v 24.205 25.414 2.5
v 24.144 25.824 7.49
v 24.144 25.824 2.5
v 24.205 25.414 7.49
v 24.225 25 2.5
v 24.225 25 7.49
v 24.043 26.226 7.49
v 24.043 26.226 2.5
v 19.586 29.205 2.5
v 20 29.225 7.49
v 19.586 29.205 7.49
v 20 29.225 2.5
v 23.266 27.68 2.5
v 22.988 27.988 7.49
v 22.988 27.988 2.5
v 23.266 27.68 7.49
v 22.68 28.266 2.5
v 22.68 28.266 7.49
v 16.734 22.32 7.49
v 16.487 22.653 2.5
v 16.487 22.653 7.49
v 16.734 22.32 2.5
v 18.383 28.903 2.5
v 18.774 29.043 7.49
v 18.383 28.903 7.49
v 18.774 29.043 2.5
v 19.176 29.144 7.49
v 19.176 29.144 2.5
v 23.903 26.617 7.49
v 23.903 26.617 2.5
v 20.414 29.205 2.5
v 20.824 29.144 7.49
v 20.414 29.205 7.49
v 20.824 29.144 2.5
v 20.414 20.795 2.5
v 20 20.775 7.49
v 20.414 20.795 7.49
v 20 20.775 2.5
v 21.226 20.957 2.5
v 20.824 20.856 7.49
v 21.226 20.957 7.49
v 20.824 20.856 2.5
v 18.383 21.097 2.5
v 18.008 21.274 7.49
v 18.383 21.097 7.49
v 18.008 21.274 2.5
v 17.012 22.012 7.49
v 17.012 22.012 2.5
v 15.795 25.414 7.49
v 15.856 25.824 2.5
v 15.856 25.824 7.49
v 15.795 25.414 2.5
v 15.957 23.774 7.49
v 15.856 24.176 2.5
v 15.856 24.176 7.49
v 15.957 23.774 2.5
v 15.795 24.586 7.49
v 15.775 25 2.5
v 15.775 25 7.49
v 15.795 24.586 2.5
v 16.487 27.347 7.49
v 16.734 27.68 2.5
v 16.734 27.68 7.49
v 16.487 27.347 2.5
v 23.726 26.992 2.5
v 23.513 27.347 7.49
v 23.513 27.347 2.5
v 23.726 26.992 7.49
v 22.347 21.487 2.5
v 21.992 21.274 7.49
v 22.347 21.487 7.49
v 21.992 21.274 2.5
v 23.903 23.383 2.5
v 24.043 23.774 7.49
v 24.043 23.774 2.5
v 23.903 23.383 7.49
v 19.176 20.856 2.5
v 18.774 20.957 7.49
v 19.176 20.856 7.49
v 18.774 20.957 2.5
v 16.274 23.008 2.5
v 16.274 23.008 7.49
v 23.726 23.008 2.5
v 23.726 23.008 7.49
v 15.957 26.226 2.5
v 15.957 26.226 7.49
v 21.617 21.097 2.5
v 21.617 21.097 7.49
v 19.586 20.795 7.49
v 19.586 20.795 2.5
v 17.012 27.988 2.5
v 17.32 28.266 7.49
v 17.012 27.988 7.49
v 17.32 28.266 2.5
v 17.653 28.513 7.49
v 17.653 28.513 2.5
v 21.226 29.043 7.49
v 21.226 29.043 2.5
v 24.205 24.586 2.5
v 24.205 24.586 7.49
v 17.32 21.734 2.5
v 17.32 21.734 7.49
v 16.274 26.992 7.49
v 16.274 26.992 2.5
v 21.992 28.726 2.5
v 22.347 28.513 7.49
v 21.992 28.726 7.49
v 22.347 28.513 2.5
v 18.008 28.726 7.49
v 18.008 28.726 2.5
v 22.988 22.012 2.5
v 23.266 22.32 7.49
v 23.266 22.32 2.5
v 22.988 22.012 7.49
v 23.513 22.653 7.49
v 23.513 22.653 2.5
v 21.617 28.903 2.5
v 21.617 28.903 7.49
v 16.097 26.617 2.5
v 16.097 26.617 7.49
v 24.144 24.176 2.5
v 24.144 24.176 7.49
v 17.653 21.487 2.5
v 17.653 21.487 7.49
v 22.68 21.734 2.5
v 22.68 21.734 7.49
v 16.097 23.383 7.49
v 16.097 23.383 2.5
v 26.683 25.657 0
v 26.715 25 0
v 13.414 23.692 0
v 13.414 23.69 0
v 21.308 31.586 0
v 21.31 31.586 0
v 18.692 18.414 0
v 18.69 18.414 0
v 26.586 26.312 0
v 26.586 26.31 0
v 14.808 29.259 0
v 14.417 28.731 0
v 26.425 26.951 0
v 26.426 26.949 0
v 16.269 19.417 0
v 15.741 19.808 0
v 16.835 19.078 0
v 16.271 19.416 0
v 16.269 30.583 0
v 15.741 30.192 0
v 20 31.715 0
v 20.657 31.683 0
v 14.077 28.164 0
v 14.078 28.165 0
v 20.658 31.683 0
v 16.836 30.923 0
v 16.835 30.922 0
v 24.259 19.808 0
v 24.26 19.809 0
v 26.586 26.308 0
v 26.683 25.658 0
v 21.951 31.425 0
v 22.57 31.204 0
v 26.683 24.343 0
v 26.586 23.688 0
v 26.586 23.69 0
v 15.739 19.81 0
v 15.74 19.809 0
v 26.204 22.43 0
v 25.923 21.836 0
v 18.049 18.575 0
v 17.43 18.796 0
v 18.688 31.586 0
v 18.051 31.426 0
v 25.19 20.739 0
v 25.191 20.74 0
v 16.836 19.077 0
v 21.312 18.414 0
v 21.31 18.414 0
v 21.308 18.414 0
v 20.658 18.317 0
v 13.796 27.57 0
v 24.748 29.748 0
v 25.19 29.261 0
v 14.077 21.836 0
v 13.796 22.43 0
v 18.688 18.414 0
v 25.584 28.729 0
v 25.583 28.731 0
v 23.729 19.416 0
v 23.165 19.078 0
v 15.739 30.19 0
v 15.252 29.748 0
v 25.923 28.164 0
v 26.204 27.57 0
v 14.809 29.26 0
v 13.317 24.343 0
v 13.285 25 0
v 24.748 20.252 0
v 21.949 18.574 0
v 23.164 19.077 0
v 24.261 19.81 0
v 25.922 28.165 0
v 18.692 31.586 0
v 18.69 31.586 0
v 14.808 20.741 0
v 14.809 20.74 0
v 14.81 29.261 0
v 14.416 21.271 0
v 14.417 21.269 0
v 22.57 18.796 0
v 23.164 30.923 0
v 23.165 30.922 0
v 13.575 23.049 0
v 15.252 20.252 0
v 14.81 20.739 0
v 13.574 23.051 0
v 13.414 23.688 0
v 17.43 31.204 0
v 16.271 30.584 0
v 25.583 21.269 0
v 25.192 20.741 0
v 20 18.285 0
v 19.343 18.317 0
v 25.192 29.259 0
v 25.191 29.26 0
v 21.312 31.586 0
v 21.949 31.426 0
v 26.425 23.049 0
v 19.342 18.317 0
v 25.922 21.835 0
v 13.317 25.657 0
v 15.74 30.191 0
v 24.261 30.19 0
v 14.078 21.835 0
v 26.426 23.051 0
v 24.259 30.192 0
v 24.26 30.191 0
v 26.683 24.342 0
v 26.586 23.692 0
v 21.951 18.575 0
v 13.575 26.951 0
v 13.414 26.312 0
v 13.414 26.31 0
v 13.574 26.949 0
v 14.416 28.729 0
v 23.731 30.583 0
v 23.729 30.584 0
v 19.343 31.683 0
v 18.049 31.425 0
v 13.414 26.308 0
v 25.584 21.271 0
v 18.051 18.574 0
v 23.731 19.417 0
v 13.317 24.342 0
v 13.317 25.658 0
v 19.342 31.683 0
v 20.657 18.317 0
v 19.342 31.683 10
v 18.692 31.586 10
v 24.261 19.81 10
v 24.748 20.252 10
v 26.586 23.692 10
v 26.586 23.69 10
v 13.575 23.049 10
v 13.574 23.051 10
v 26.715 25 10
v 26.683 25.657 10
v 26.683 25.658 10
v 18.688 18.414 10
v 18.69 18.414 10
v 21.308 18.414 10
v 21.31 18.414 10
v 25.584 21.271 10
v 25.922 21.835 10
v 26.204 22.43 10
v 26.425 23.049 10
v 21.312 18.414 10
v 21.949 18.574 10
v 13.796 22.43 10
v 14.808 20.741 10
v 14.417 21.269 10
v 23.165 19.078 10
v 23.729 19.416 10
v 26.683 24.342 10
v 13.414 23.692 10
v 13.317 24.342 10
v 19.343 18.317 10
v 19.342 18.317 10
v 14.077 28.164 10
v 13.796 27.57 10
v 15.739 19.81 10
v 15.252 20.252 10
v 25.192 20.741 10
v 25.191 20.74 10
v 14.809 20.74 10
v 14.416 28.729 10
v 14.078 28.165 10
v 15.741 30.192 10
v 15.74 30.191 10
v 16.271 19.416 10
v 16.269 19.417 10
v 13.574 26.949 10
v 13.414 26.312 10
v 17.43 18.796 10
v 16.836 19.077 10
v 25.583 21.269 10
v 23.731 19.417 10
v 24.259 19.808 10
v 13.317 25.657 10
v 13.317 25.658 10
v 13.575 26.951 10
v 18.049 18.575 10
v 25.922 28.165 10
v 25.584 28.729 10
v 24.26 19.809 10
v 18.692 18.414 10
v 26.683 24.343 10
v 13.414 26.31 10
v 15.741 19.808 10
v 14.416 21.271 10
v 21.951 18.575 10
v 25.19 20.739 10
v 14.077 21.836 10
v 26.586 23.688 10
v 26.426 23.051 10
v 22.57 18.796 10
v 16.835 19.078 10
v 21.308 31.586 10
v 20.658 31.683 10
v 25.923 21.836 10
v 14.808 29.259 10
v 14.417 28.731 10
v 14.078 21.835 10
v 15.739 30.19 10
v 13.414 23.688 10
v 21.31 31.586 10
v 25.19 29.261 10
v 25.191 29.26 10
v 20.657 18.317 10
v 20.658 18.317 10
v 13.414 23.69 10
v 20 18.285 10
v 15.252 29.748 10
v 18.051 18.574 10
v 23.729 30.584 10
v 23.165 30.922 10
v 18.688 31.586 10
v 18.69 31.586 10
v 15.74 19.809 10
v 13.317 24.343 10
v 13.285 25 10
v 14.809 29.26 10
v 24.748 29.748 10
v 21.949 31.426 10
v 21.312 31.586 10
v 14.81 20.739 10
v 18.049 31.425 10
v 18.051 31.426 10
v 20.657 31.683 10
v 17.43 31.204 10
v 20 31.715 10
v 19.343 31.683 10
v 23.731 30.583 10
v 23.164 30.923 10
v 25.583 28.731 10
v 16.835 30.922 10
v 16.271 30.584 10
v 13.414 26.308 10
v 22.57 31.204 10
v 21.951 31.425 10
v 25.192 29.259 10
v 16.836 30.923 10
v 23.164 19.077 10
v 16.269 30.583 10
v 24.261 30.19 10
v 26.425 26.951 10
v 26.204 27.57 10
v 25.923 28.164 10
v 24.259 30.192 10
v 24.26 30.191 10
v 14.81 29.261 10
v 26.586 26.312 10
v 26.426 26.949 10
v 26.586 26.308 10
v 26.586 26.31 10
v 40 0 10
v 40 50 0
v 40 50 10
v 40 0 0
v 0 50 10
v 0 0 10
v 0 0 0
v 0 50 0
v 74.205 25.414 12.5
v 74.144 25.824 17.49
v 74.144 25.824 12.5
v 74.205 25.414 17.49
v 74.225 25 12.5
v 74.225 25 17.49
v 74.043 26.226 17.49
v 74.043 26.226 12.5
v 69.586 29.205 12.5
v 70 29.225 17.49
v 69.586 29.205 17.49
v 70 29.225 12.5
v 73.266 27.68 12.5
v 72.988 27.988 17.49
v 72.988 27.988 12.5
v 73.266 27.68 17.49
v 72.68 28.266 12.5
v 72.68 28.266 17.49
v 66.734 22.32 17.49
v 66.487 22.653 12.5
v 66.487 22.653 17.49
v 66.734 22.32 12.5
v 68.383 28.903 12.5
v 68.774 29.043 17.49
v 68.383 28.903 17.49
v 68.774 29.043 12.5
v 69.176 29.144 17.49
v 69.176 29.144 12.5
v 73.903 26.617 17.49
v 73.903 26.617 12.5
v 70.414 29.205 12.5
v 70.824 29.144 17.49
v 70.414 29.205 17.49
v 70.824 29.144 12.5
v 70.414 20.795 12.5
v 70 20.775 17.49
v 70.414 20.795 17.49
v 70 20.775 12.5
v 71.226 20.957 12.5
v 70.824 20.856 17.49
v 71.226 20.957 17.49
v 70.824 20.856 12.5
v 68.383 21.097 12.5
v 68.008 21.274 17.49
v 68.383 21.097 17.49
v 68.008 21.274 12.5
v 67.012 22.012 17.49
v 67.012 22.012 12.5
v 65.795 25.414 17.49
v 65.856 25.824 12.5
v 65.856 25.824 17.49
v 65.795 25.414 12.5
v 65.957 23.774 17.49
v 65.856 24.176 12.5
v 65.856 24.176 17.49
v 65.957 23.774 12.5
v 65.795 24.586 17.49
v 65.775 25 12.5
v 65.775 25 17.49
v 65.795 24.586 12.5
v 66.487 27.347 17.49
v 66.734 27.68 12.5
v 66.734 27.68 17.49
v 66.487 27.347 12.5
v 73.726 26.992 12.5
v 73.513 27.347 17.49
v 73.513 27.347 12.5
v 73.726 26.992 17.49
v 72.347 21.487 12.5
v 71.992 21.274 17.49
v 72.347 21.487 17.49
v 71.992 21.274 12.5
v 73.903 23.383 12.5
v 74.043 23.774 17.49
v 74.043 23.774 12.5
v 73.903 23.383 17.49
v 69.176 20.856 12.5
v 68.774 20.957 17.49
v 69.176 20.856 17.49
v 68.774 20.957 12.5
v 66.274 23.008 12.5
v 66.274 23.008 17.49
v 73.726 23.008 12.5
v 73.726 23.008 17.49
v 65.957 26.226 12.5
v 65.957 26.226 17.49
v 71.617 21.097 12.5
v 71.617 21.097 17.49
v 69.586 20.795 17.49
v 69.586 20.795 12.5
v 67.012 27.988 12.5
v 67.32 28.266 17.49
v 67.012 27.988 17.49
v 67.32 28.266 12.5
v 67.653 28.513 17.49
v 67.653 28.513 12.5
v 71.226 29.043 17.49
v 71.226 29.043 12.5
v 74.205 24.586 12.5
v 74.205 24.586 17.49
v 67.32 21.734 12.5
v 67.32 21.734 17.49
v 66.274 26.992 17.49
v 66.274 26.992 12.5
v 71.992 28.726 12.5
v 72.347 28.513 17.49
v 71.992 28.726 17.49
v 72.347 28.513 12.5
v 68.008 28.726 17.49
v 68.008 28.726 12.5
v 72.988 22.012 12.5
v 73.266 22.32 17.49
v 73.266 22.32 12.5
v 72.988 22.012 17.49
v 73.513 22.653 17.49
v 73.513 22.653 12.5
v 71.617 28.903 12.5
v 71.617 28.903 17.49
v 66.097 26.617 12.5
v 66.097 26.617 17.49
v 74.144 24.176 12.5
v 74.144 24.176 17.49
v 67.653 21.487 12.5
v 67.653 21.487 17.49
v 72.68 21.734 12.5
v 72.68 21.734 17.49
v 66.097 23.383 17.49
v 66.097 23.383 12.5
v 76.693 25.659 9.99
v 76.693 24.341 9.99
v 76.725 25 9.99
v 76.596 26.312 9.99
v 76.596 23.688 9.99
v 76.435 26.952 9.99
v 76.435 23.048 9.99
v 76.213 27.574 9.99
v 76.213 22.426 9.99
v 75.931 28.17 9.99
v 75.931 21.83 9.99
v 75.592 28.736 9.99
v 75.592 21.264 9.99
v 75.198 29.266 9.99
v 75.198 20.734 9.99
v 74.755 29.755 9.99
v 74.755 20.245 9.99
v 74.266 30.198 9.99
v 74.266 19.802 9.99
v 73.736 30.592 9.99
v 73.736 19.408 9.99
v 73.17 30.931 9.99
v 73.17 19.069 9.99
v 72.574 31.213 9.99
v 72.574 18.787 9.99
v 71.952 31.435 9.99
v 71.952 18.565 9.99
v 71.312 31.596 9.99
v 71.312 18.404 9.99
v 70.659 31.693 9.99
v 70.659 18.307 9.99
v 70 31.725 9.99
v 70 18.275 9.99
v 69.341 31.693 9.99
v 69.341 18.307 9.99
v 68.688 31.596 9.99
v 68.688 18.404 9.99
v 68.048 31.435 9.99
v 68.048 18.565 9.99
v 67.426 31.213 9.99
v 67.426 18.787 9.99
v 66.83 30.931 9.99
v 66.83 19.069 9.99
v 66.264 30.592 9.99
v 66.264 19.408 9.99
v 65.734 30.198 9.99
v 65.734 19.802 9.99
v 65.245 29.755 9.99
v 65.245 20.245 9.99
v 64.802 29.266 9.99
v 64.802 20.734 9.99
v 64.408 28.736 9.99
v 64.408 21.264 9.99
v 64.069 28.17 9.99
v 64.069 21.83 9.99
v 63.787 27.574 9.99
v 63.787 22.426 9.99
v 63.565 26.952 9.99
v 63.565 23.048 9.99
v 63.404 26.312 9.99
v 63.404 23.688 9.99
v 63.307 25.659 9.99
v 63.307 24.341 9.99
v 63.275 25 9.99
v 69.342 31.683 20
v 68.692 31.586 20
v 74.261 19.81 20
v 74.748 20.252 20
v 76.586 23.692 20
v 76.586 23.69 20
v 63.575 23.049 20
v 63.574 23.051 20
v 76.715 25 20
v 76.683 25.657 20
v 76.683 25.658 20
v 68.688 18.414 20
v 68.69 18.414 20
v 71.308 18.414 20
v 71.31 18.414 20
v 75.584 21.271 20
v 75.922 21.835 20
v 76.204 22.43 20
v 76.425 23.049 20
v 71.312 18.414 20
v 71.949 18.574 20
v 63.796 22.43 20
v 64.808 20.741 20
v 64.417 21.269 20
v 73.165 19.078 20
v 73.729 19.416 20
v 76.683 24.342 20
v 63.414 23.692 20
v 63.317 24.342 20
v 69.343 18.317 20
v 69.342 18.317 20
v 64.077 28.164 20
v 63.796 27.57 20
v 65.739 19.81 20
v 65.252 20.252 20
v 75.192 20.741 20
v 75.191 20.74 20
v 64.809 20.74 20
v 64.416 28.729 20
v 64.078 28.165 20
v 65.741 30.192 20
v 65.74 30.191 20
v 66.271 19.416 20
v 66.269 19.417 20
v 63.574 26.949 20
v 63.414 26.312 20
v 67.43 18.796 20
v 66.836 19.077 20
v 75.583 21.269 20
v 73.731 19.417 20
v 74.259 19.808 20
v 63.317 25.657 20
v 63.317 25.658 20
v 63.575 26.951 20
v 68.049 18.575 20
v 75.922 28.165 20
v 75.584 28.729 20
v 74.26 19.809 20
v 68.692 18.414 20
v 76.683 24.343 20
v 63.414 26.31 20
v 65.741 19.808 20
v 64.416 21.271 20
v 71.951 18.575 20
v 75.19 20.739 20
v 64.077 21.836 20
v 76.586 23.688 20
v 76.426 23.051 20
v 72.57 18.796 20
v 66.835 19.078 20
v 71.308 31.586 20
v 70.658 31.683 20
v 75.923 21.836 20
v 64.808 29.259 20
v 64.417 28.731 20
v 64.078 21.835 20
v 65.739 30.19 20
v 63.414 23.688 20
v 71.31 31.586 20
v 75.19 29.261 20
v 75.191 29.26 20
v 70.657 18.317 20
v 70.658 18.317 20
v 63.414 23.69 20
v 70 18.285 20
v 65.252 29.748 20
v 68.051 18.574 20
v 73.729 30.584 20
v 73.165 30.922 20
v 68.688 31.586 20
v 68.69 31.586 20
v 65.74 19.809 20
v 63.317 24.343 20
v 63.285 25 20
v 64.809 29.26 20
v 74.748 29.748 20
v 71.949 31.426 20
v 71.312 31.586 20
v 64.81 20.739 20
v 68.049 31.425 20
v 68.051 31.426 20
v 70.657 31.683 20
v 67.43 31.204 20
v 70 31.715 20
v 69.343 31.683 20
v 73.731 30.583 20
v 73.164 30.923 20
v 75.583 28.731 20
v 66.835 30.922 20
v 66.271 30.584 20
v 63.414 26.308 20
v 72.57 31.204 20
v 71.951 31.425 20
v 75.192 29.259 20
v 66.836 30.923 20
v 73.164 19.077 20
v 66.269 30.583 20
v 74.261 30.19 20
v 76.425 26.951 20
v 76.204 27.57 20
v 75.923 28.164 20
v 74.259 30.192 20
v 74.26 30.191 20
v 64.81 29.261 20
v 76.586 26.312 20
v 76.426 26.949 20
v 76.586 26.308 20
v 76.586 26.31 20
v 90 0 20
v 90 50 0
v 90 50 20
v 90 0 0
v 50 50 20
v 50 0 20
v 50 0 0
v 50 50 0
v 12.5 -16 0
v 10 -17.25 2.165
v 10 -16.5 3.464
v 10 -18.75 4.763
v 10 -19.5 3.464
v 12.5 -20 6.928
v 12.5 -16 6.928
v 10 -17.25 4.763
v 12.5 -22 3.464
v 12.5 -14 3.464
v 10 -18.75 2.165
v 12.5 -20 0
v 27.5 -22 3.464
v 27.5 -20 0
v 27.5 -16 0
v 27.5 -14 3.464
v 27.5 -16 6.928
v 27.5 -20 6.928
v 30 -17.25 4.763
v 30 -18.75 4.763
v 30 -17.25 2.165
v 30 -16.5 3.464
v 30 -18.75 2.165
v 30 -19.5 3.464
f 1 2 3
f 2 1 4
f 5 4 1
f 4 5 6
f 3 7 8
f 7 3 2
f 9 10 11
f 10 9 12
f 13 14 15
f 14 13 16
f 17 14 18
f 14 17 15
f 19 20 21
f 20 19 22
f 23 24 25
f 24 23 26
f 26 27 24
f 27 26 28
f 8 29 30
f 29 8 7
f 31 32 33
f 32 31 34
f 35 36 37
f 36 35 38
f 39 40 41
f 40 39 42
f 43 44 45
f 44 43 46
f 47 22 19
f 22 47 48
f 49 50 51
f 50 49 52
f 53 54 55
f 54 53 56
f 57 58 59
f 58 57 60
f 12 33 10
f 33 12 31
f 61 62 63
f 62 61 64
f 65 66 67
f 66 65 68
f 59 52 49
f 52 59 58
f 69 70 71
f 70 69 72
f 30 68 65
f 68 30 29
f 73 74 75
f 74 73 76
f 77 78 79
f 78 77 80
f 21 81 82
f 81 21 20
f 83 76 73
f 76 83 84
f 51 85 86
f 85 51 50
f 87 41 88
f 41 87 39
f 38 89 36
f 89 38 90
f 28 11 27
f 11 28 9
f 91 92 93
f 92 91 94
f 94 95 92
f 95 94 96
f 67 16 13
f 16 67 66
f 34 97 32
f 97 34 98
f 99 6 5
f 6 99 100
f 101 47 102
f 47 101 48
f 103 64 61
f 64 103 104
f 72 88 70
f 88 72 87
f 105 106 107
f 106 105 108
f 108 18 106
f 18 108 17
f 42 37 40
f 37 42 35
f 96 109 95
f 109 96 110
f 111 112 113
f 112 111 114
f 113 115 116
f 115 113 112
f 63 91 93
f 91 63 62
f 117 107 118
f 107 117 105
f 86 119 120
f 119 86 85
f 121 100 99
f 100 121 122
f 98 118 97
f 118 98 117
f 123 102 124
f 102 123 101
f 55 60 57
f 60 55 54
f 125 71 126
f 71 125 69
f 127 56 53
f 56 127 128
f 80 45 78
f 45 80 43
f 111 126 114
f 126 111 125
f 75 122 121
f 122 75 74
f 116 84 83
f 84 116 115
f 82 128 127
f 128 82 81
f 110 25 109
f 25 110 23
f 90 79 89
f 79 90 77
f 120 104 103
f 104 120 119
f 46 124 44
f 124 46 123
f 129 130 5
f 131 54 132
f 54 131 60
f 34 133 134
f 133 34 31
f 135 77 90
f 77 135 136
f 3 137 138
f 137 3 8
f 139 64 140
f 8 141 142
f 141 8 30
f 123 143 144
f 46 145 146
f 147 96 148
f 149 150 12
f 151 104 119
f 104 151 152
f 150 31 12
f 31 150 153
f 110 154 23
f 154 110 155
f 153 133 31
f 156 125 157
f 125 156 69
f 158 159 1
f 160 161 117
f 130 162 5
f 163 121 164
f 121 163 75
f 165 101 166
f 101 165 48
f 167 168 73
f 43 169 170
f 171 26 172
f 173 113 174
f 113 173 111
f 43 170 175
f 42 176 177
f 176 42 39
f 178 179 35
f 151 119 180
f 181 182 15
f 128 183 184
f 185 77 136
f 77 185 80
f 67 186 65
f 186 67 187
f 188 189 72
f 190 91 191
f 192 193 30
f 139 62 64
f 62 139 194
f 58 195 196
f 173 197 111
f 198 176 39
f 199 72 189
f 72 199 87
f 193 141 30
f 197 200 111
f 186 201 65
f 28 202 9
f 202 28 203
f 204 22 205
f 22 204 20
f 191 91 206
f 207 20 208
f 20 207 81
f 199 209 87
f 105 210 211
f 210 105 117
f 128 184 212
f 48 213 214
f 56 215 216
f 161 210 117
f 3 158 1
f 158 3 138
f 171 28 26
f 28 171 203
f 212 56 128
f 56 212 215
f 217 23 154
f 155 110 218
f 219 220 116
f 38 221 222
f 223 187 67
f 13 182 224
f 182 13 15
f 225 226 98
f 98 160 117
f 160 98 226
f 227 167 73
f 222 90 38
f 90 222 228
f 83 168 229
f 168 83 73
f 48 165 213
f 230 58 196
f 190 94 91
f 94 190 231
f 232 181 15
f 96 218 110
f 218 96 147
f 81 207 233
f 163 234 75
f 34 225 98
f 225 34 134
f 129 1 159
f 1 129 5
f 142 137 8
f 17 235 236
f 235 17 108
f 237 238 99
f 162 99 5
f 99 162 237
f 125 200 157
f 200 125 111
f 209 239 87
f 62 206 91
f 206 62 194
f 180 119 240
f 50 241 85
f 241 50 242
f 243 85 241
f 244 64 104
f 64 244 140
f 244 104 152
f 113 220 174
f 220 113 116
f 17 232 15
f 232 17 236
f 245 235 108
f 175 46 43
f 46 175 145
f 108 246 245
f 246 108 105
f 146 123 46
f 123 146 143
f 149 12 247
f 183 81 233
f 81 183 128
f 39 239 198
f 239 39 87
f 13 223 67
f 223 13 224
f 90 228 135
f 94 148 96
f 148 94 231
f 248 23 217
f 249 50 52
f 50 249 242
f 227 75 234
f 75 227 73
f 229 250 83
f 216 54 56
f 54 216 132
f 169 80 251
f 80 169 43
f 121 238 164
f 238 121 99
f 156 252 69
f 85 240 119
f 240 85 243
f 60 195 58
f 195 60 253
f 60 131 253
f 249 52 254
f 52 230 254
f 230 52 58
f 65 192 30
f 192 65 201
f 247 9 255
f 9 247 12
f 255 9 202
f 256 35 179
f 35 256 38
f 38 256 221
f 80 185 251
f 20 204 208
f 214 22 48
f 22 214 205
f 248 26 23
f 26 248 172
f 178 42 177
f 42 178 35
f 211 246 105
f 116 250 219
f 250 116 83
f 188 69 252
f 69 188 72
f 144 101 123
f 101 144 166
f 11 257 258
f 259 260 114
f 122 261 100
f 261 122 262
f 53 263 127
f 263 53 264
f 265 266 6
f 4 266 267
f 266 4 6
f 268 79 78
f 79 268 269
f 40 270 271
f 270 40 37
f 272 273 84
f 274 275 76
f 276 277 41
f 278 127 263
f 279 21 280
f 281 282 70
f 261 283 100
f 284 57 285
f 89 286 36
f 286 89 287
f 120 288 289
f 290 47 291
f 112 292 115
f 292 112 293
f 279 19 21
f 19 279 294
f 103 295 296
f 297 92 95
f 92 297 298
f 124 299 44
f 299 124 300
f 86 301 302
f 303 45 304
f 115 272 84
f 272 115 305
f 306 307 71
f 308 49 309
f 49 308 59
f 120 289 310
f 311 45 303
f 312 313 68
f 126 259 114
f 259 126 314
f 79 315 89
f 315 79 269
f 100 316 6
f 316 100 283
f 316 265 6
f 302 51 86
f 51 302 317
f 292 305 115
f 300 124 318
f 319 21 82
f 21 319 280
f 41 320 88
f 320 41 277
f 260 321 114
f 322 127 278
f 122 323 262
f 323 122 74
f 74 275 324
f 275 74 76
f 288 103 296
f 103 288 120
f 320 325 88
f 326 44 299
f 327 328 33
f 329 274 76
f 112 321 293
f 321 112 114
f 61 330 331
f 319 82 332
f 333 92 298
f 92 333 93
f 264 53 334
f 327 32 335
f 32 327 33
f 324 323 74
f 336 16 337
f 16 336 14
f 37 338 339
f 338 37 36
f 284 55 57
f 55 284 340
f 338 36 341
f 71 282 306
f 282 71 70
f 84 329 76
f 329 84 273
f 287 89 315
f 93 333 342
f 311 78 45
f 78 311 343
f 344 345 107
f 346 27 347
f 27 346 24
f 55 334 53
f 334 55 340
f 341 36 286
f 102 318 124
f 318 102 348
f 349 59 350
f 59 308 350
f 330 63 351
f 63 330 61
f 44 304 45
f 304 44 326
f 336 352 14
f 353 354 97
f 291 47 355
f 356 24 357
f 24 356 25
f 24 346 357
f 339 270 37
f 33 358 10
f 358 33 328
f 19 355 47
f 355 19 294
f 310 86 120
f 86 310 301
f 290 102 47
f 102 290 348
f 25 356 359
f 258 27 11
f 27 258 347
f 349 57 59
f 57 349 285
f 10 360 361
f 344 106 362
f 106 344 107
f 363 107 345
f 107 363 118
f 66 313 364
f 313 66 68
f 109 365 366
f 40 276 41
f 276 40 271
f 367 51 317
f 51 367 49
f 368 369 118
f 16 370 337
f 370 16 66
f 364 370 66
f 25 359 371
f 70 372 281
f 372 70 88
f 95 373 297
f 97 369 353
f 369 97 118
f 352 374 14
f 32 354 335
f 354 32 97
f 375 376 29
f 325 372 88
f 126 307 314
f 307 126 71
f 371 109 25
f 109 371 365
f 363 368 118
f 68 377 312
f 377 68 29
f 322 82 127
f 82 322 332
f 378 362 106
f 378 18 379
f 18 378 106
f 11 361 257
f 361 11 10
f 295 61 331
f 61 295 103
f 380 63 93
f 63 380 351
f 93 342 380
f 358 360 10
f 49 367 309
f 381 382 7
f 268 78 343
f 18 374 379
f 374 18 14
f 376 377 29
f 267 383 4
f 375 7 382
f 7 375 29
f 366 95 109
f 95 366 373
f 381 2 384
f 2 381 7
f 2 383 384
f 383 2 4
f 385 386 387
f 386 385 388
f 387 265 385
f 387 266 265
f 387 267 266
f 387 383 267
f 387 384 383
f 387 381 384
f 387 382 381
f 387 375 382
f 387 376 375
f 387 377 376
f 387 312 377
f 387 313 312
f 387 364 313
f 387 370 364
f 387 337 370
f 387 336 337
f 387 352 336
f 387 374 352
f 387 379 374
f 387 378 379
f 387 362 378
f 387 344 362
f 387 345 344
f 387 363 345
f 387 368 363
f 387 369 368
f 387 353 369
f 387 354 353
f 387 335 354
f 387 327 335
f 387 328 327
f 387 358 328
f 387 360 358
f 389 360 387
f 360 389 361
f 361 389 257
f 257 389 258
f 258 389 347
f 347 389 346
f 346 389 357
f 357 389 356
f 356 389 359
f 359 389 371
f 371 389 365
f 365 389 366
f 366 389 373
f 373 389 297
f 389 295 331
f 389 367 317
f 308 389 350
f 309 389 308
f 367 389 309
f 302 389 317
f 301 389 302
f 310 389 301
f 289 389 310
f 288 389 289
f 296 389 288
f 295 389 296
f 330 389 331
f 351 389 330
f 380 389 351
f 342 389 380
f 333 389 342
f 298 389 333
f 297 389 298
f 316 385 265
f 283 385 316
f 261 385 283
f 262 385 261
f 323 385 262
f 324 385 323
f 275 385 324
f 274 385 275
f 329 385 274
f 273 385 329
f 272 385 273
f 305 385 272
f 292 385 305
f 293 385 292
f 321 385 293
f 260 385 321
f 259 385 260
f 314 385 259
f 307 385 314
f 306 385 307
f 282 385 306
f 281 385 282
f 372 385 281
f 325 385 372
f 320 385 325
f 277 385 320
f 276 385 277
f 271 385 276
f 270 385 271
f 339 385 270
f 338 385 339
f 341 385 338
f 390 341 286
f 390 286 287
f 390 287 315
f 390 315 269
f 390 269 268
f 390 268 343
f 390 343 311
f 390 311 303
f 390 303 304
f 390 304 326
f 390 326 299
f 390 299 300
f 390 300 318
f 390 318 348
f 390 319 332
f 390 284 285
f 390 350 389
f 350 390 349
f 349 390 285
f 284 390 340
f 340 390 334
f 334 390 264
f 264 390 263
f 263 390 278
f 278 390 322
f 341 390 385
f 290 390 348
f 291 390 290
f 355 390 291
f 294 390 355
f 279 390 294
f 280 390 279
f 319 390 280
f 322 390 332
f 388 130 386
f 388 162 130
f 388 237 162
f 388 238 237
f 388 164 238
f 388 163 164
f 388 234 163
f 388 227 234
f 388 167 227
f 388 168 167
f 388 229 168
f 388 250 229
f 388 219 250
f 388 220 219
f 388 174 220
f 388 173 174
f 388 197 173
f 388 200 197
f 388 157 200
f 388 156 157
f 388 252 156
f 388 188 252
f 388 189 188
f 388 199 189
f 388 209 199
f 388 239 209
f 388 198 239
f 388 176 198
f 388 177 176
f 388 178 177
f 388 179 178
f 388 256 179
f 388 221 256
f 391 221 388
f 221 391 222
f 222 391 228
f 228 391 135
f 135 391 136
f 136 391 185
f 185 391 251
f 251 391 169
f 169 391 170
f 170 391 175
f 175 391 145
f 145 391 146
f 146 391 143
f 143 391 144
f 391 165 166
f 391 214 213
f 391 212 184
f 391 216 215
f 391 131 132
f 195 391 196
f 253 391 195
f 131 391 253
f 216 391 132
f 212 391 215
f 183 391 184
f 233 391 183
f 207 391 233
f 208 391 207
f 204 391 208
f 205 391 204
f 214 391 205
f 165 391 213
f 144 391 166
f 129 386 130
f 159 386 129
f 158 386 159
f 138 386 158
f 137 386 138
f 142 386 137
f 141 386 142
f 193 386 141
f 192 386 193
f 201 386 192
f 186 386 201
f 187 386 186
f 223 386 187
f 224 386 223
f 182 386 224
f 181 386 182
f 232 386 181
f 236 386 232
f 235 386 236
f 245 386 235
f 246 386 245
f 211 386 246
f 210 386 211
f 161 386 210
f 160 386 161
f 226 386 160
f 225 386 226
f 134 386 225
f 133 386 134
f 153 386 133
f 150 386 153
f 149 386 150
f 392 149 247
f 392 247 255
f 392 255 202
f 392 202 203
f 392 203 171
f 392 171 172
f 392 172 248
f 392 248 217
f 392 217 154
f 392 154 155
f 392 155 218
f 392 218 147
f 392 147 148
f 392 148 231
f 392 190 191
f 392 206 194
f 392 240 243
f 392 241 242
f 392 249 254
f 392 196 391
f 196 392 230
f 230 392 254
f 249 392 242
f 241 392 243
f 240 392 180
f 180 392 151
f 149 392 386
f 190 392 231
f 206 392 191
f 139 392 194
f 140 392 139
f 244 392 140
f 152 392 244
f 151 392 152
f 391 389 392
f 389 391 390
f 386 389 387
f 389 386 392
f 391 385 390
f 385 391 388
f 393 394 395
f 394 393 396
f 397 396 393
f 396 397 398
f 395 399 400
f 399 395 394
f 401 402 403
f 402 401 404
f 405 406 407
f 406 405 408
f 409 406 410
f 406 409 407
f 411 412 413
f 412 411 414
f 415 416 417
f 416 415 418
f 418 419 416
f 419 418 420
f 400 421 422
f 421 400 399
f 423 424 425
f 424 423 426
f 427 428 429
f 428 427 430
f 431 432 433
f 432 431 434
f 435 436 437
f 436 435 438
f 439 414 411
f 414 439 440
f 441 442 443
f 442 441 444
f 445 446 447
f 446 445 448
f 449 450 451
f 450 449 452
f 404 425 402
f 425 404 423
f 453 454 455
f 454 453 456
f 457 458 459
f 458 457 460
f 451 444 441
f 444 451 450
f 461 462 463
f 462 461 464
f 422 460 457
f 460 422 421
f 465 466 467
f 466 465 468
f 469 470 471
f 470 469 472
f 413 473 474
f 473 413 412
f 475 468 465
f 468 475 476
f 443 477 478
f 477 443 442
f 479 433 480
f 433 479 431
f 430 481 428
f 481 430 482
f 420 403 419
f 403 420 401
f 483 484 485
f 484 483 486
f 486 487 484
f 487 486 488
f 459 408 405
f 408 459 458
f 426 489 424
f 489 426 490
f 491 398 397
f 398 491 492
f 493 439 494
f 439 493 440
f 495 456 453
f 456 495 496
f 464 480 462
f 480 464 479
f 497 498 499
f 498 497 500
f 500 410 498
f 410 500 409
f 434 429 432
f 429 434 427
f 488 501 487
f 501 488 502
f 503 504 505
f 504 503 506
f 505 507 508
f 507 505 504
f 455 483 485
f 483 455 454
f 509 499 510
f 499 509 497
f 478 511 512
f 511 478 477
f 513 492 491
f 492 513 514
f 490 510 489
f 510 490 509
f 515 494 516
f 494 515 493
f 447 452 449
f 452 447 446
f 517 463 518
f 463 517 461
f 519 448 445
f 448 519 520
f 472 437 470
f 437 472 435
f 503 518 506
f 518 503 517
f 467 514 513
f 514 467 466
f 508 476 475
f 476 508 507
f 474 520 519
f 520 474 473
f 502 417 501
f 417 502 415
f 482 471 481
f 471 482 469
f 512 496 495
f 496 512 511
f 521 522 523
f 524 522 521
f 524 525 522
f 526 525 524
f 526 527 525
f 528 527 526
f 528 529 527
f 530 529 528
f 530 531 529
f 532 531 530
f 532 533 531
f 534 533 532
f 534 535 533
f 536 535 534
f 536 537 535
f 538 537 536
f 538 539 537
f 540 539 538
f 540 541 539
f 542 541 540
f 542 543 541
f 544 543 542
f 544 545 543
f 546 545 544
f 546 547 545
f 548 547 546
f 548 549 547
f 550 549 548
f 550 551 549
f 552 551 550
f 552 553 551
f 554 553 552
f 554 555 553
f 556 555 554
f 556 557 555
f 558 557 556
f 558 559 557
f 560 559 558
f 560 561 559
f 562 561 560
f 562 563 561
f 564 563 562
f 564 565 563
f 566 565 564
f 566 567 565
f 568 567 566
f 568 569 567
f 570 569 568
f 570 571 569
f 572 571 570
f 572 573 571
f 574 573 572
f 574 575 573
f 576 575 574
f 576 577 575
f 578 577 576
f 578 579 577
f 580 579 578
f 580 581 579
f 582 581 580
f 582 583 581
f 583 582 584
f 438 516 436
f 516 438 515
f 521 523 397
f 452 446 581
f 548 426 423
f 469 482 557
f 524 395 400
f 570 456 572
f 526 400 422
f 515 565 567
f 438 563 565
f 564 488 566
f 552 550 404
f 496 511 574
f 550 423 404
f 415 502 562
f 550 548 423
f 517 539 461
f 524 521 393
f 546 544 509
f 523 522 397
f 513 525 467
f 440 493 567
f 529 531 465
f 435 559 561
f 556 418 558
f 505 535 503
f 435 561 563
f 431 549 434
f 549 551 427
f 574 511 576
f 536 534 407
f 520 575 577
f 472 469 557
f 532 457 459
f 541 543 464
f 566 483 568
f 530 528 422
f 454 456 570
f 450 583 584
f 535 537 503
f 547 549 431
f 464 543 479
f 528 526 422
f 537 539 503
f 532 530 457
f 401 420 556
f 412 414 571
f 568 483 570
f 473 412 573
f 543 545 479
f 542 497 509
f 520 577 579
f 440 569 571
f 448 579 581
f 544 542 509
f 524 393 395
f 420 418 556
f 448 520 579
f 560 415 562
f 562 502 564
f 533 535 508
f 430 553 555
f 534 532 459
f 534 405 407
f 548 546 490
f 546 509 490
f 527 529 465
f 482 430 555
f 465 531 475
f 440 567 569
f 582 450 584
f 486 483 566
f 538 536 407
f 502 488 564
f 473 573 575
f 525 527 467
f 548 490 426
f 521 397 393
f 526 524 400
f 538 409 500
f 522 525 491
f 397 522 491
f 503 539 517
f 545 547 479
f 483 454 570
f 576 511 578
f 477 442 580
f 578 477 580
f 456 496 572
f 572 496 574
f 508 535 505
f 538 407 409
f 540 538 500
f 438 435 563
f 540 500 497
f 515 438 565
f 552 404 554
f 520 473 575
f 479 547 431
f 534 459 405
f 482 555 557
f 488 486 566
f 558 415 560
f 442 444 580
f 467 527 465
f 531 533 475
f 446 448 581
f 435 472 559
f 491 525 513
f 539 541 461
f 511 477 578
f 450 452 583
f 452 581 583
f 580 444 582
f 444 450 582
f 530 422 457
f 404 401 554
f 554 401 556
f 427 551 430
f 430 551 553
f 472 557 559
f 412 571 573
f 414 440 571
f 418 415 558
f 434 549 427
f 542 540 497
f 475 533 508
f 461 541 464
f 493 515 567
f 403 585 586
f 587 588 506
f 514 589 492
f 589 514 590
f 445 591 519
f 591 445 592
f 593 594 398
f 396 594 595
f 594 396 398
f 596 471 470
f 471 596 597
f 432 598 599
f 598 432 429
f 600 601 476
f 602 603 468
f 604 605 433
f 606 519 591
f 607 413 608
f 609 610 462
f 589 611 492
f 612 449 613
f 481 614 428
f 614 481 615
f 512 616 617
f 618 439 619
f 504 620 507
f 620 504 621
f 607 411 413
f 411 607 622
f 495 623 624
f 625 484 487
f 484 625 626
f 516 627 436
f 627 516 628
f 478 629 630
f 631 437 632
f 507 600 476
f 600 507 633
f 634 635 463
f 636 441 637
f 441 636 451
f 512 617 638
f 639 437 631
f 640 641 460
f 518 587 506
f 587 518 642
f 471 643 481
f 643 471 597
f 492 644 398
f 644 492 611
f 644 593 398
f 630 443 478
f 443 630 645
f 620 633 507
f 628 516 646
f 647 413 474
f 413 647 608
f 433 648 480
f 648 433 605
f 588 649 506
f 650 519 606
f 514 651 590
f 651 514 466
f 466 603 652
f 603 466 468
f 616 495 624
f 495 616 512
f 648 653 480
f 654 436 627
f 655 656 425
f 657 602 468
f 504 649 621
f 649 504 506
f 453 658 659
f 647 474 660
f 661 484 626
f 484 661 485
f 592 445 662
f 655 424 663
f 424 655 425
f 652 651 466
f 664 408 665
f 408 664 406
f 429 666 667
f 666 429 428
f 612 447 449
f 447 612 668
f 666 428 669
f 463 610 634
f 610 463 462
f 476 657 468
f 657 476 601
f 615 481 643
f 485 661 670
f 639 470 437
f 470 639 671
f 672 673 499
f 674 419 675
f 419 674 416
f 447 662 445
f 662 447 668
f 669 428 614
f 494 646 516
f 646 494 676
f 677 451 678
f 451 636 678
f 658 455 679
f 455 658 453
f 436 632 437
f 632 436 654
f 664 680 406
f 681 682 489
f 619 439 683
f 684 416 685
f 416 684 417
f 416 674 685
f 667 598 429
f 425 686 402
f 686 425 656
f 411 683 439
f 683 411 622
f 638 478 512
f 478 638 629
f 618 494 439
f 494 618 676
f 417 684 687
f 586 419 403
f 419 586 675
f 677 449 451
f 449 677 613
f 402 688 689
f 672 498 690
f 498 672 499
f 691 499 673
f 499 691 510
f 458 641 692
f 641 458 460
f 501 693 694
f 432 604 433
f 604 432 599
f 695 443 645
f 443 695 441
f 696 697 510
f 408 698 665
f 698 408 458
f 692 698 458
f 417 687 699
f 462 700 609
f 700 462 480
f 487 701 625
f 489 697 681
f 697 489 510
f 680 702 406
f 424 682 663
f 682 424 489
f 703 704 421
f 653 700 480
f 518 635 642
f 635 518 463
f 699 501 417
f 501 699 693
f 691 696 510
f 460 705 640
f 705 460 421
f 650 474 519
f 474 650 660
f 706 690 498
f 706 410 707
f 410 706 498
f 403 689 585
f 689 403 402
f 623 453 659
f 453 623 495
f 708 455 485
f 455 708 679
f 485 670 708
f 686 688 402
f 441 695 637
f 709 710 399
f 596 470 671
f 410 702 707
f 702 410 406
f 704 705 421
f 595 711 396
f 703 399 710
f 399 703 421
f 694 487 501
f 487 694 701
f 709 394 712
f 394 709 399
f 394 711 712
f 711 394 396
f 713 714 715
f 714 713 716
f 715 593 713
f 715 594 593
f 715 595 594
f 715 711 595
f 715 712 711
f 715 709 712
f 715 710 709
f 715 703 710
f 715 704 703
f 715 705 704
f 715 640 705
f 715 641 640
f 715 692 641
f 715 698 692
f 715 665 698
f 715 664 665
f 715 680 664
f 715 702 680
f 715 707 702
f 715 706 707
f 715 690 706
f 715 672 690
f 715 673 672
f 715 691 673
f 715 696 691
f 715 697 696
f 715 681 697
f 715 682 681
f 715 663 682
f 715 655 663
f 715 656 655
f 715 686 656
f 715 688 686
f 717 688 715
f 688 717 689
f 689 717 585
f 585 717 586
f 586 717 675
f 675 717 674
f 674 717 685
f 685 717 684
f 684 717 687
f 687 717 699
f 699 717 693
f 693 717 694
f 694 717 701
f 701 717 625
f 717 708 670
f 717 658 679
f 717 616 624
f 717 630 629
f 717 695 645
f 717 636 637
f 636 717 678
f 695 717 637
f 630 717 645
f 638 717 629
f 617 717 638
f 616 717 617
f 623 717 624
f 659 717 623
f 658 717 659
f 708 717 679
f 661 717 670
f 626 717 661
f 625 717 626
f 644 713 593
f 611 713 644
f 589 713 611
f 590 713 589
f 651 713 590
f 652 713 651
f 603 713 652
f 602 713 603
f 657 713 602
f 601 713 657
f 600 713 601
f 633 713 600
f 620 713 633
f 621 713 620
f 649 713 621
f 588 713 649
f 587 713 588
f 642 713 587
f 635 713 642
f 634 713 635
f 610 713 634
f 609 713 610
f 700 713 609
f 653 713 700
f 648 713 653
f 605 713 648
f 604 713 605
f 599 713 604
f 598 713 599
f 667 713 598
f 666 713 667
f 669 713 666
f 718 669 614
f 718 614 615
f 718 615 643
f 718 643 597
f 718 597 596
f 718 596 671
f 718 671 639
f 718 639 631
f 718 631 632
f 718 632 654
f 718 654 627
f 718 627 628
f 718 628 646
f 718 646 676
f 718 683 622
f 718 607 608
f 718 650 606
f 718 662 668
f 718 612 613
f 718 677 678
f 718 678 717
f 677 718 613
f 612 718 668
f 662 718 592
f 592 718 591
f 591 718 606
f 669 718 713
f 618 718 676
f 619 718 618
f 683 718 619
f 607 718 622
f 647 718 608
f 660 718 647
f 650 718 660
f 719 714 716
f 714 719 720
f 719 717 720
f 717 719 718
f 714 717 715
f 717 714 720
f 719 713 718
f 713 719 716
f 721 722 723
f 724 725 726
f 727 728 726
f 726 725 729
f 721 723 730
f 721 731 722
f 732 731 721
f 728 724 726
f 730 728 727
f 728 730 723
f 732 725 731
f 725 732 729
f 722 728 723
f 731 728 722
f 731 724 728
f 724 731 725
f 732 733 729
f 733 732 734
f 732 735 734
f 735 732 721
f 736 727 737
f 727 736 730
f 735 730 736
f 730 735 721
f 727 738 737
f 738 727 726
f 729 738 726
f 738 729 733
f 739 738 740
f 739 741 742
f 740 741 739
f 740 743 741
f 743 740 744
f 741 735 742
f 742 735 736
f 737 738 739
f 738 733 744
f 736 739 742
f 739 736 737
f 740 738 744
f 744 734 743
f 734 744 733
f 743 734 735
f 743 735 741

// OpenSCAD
// file: ../peg.scad
// peg.scad
// version: 0.5.0
// Prototype laid-down hex peg for vertical Hutchfinity casing stacks.

$fn = 64;
EPS = 0.01;

// Diameter is point-to-point across the hex. The default matches the current
// casing socket default: 8.0mm nominal peg + 0.45mm socket clearance.
PEG_DIAMETER = 8.45;
// Two nominal 10 mm receivers leave 0.4 mm total axial allowance.
PEG_LENGTH = 19.6;
PEG_END_CHAMFER = 2.5;
PEG_CORE_SIDES = 6;
PEG_PRINT_FACE_ROTATION = 30;

function peg_tip_diameter(diameter, chamfer) = max(0.8, diameter - 2 * chamfer);
function peg_flat_to_flat_diameter(diameter, core_sides) =
    diameter * cos(180 / core_sides);

module chamfered_peg_core(diameter, length, chamfer, core_sides) {
    tip_d = peg_tip_diameter(diameter, chamfer);

    union() {
        cylinder(d1=tip_d, d2=diameter, h=chamfer, $fn=core_sides);
        translate([0, 0, chamfer])
            cylinder(d=diameter, h=max(EPS, length - 2 * chamfer), $fn=core_sides);
        translate([0, 0, length - chamfer])
            cylinder(d1=diameter, d2=tip_d, h=chamfer, $fn=core_sides);
    }
}

module hutchfinity_peg(
    diameter=PEG_DIAMETER,
    length=PEG_LENGTH,
    end_chamfer=PEG_END_CHAMFER,
    core_sides=PEG_CORE_SIDES
) {
    chamfer = min(end_chamfer, length / 2 - EPS);

    assert(diameter > 0 && length > 0, "peg diameter and length must be positive");
    assert(end_chamfer >= 0, "peg end chamfer must be non-negative");
    assert(core_sides >= 3, "peg core needs at least three sides");

    chamfered_peg_core(diameter, length, chamfer, core_sides);
}

module hutchfinity_peg_print_layout(
    diameter=PEG_DIAMETER,
    length=PEG_LENGTH,
    end_chamfer=PEG_END_CHAMFER,
    core_sides=PEG_CORE_SIDES,
    print_face_rotation=PEG_PRINT_FACE_ROTATION
) {
    translate([0, 0, peg_flat_to_flat_diameter(diameter, core_sides) / 2])
        rotate([0, 90, 0])
            rotate([0, 0, print_face_rotation])
                hutchfinity_peg(
                    diameter=diameter,
                    length=length,
                    end_chamfer=end_chamfer,
                    core_sides=core_sides
                );
}

hutchfinity_peg_print_layout();
// main file
// peg_stack_interface_testbed.scad
// version: 0.5.0
// Coupon for the two-ended Hutchfinity vertical stack ribbed-peg interface.
// This tests the integrated stack-land condition from casing.scad.

use <../casing.scad>;
use <../peg.scad>;

$fn = 64;

PEG_DIAMETER = 8.0;
PEG_CLEARANCE = 0.45;
PEG_LENGTH = 20.0;
PEG_SOCKET_DEPTH = 10.0;
PEG_CHAMFER = 2.5;

STACK_LAND_WIDTH = 40.0;
STACK_LAND_LENGTH = 50.0;
COUPON_X = STACK_LAND_WIDTH;
COUPON_Y = STACK_LAND_LENGTH;
TOP_COUPON_Z = PEG_SOCKET_DEPTH;
FOOT_COUPON_Z = 20.0;
COUPON_GAP = 10.0;
PEG_GAP_Y = 18.0;
function foot_origin_x() = COUPON_X + COUPON_GAP;
function socket_diameter() = peg_socket_diameter(PEG_DIAMETER, PEG_CLEARANCE);
function socket_x() = STACK_LAND_WIDTH / 2;
function socket_center() = [socket_x(), COUPON_Y / 2];

module top_slab_socket_coupon() {
    union() {
        difference() {
            cube([COUPON_X, COUPON_Y, TOP_COUPON_Z]);
            chamfered_peg_socket_cut(
                socket_center(),
                socket_diameter(),
                PEG_SOCKET_DEPTH,
                PEG_CHAMFER
            );
        }
    }
}

module wall_foot_receiver_coupon() {
    translate([foot_origin_x(), 0, 0])
    union() {
        difference() {
            cube([COUPON_X, COUPON_Y, FOOT_COUPON_Z]);
            chamfered_peg_socket_cut(
                socket_center(),
                socket_diameter(),
                PEG_SOCKET_DEPTH,
                PEG_CHAMFER,
                FOOT_COUPON_Z - PEG_SOCKET_DEPTH
            );
        }
    }
}

module loose_peg() {
    translate([COUPON_X / 2 - PEG_LENGTH / 2, -PEG_GAP_Y, 0])
    hutchfinity_peg_print_layout(
        diameter=PEG_DIAMETER,
        length=PEG_LENGTH,
        end_chamfer=PEG_CHAMFER
    );
}

module peg_stack_interface_testbed() {
    assert(PEG_LENGTH == 2 * PEG_SOCKET_DEPTH,
        "peg length should match lower top-slab socket plus upper foot receiver depth");

    top_slab_socket_coupon();
    wall_foot_receiver_coupon();
    loose_peg();
}

peg_stack_interface_testbed();
